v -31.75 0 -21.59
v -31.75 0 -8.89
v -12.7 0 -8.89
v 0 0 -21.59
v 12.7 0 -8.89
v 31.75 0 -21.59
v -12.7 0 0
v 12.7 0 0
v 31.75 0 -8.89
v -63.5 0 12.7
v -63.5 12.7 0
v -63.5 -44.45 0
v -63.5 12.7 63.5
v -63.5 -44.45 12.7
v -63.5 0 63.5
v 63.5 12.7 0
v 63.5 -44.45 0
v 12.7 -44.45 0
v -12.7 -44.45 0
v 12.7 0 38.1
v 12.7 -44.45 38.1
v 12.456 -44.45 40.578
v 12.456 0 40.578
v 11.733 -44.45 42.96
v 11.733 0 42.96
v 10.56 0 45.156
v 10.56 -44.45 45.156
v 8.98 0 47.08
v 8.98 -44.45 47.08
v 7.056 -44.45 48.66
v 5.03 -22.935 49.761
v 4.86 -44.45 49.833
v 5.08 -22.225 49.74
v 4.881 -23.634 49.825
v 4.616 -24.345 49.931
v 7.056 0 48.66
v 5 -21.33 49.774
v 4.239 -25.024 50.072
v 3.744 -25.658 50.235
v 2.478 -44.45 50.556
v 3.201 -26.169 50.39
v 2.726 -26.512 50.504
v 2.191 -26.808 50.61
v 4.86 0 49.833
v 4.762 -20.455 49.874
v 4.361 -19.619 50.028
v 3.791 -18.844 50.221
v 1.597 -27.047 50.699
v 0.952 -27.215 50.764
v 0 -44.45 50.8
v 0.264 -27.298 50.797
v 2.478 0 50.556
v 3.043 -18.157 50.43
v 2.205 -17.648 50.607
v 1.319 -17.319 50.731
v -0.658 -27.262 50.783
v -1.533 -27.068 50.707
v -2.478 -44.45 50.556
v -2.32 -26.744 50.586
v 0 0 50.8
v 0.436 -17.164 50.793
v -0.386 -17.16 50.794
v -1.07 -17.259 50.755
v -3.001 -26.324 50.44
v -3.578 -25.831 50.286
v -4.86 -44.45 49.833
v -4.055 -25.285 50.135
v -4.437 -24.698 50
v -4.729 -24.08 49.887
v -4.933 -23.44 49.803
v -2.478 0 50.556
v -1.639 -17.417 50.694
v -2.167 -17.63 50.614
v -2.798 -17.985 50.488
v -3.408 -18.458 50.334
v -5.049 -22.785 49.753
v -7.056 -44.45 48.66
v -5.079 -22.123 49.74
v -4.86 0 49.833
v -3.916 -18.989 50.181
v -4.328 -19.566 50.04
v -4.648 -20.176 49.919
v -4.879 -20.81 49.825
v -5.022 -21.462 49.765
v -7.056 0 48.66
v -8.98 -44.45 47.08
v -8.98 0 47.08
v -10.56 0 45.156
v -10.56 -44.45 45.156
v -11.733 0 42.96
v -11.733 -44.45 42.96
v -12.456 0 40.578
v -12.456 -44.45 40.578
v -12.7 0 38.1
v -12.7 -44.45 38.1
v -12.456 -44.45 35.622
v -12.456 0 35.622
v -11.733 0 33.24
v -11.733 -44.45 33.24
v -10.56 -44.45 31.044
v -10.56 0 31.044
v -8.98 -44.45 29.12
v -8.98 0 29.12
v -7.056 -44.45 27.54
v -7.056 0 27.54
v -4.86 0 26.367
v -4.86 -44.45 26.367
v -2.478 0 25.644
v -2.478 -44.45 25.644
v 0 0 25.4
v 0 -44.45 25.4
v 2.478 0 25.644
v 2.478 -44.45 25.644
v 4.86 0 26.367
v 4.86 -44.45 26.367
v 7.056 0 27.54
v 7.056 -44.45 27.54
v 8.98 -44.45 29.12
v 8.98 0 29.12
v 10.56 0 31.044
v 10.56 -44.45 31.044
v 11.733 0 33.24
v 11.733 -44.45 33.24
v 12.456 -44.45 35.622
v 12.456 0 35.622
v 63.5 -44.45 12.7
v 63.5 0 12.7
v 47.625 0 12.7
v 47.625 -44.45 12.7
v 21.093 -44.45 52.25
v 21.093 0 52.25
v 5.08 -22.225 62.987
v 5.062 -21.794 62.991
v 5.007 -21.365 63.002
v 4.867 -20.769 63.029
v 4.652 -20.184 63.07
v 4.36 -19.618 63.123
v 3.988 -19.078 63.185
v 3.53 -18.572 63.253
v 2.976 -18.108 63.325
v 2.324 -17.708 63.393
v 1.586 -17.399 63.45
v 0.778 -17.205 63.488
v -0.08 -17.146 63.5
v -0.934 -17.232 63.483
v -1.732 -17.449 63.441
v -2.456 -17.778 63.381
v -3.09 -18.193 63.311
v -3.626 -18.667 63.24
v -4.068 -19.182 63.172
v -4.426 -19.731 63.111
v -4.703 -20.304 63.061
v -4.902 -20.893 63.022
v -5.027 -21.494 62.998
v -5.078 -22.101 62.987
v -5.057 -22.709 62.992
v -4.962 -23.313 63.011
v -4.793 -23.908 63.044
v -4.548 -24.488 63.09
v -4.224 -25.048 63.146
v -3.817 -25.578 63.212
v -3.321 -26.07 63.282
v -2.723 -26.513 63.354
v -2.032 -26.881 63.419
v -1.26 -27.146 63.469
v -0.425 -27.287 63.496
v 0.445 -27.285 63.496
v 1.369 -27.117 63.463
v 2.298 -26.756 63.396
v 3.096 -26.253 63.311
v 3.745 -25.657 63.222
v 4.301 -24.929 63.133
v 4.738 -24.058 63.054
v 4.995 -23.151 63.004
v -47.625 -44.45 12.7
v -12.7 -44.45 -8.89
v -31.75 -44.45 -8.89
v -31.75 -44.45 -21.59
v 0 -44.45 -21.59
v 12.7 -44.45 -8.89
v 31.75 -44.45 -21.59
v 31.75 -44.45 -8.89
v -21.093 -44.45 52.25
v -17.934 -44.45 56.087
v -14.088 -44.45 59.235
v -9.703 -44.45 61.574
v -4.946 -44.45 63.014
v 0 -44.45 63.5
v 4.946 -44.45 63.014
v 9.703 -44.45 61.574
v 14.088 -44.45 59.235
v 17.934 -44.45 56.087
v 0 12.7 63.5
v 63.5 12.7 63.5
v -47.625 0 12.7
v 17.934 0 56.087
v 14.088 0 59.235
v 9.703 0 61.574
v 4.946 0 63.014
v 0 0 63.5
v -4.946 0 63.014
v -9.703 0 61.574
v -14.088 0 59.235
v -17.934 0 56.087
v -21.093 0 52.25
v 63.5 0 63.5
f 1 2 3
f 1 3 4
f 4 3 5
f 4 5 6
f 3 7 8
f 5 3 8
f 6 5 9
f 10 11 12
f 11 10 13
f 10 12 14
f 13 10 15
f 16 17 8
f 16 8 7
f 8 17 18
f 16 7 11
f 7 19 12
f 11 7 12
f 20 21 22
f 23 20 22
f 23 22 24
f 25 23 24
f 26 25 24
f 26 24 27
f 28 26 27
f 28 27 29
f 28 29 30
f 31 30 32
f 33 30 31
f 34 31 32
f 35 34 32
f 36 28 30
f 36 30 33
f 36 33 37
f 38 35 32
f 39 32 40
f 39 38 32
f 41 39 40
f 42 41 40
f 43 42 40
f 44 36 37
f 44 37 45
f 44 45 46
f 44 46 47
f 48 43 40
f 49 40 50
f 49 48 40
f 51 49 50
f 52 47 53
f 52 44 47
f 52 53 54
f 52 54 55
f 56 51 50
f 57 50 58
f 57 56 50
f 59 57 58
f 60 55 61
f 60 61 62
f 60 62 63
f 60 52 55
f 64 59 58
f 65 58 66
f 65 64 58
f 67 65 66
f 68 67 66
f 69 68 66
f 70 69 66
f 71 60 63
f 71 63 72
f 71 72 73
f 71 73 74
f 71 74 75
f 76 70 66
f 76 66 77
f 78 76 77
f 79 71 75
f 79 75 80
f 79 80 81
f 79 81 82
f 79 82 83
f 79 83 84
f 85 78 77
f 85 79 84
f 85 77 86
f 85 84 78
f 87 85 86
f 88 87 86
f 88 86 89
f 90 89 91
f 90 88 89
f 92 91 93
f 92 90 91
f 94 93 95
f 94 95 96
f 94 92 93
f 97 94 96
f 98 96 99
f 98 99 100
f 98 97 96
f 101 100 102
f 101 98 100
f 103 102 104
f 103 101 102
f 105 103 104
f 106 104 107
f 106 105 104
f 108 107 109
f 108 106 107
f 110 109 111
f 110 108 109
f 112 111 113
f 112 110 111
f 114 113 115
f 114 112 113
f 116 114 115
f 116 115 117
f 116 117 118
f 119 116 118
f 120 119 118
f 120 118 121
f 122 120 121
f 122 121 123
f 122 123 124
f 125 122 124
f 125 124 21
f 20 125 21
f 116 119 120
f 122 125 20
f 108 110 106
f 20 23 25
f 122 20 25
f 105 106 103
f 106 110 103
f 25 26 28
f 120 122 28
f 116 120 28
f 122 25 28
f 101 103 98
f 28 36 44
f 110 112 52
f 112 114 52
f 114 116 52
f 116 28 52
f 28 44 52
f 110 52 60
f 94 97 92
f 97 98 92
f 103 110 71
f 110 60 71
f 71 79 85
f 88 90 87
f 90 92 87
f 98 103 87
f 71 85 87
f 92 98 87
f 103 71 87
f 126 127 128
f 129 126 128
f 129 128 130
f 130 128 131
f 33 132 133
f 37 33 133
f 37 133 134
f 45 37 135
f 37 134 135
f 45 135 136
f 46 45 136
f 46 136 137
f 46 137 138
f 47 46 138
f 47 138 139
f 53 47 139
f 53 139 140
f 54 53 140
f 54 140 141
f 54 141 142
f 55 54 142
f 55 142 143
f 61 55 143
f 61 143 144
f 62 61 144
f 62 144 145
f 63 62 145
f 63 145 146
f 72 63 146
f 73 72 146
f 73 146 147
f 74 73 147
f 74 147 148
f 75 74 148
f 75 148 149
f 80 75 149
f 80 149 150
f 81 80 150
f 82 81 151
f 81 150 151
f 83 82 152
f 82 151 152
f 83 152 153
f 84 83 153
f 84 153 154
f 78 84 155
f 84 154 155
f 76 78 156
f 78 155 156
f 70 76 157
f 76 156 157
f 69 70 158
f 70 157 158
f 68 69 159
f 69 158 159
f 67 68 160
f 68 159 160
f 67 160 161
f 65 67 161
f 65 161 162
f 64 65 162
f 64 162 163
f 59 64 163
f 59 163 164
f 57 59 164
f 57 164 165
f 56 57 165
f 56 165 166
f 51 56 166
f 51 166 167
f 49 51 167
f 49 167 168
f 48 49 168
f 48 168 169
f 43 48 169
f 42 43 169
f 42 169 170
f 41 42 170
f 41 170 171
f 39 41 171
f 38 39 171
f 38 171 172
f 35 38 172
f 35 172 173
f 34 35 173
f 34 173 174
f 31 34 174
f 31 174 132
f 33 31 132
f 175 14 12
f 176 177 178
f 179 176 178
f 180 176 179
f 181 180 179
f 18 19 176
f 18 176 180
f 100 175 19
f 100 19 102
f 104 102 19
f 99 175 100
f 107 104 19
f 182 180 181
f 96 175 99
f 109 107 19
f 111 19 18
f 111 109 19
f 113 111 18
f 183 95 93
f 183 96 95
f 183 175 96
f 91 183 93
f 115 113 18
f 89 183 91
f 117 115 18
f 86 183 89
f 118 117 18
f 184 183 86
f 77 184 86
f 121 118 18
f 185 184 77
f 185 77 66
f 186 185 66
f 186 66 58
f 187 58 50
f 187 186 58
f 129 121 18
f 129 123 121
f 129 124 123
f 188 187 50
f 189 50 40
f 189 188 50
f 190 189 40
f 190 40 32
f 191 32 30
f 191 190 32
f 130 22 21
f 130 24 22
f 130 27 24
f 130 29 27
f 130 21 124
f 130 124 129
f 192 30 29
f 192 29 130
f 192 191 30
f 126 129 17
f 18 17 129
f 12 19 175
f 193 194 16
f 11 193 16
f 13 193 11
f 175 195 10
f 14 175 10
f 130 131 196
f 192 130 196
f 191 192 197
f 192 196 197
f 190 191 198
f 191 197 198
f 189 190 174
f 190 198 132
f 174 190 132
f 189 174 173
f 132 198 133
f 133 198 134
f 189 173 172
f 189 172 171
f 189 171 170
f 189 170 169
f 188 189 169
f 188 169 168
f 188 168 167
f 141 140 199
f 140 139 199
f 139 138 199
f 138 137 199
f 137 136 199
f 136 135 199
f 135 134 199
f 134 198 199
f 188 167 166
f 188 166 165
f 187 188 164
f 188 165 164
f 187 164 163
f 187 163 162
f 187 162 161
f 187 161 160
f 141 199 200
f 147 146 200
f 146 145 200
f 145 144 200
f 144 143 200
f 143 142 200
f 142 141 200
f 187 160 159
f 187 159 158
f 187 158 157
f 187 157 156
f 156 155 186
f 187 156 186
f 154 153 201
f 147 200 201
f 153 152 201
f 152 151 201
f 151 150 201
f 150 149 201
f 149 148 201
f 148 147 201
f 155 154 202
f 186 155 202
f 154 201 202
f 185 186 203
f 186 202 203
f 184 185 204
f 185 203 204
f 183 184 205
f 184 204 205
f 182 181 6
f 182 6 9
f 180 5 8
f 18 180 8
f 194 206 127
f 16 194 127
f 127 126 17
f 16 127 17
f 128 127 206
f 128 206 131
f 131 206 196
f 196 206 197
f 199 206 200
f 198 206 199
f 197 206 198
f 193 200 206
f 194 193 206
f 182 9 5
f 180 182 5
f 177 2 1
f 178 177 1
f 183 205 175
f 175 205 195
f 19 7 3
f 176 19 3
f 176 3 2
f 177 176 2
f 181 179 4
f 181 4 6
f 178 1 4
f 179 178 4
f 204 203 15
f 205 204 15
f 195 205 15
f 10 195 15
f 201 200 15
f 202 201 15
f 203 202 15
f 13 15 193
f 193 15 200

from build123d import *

# Parameters (mm, degrees)
F0_R     = 12.7
F1_DEPTH = 44.45
F3_DEPTH = 12.7
F4_R     = 5.08
F5_DEPTH = 14.7602579501


with BuildPart() as f1:
    # F0 (on Front) → F1 (new body)
    with BuildSketch(Plane.XZ):
        with BuildLine():
            Line((-31.75, -21.59), (0, -21.59))
            Line((0, -21.59), (31.75, -21.5900009905))
            Line((31.75, -21.5900009905), (31.75, -8.89))
            Line((31.75, -8.89), (12.7, -8.89))
            Line((12.7, -8.89), (12.7, 0))
            Line((12.7, 0), (63.4999997359, 0))
            Line((63.4999997359, 0), (63.4999997359, 12.6999990095))
            Line((63.4999997359, 12.6999990095), (47.6249997359, 12.6999990095))
            Line((47.6249997359, 12.6999990095), (21.0934258346, 52.2501726688))
            ThreePointArc((21.0934258346, 52.2501726688), (2.641e-07, 63.5), (-21.0934255404, 52.2501731075))
            Line((-21.0934255404, 52.2501731075), (-47.6250002641, 12.7))
            Line((-47.6250002641, 12.7), (-63.5000002641, 12.7))
            Line((-63.5000002641, 12.7), (-63.5000002641, 0))
            Line((-63.5000002641, 0), (-12.7, 0))
            Line((-12.7, 0), (-12.7, -8.89))
            Line((-12.7, -8.89), (-31.75, -8.89))
            Line((-31.75, -8.89), (-31.75, -21.59))
        make_face()
        with Locations((0, 38.1)):
            Circle(F0_R, mode=Mode.SUBTRACT)
    extrude(amount=F1_DEPTH)

    # F2 (on face) → F3 (join)
    with BuildSketch(Plane(origin=(0, 0, 0), x_dir=(-1, 0, 0), z_dir=(0, 1, 0))):
        Polygon((-63.4999997359, 63.5), (-63.4999997359, 0), (63.5000002641, 0), (63.5000002641, 12.7), (63.5000002641, 63.5000006603), (-2.641e-07, 63.5), align=None)
    extrude(amount=F3_DEPTH)

    # F4 (on face) → F5 (cut, up to face)
    with BuildSketch(Plane.XY.offset(63.5)):
        with Locations((2.641e-07, -22.225)):
            Circle(F4_R)
    extrude(amount=-F5_DEPTH, mode=Mode.SUBTRACT)


solid = f1.part
